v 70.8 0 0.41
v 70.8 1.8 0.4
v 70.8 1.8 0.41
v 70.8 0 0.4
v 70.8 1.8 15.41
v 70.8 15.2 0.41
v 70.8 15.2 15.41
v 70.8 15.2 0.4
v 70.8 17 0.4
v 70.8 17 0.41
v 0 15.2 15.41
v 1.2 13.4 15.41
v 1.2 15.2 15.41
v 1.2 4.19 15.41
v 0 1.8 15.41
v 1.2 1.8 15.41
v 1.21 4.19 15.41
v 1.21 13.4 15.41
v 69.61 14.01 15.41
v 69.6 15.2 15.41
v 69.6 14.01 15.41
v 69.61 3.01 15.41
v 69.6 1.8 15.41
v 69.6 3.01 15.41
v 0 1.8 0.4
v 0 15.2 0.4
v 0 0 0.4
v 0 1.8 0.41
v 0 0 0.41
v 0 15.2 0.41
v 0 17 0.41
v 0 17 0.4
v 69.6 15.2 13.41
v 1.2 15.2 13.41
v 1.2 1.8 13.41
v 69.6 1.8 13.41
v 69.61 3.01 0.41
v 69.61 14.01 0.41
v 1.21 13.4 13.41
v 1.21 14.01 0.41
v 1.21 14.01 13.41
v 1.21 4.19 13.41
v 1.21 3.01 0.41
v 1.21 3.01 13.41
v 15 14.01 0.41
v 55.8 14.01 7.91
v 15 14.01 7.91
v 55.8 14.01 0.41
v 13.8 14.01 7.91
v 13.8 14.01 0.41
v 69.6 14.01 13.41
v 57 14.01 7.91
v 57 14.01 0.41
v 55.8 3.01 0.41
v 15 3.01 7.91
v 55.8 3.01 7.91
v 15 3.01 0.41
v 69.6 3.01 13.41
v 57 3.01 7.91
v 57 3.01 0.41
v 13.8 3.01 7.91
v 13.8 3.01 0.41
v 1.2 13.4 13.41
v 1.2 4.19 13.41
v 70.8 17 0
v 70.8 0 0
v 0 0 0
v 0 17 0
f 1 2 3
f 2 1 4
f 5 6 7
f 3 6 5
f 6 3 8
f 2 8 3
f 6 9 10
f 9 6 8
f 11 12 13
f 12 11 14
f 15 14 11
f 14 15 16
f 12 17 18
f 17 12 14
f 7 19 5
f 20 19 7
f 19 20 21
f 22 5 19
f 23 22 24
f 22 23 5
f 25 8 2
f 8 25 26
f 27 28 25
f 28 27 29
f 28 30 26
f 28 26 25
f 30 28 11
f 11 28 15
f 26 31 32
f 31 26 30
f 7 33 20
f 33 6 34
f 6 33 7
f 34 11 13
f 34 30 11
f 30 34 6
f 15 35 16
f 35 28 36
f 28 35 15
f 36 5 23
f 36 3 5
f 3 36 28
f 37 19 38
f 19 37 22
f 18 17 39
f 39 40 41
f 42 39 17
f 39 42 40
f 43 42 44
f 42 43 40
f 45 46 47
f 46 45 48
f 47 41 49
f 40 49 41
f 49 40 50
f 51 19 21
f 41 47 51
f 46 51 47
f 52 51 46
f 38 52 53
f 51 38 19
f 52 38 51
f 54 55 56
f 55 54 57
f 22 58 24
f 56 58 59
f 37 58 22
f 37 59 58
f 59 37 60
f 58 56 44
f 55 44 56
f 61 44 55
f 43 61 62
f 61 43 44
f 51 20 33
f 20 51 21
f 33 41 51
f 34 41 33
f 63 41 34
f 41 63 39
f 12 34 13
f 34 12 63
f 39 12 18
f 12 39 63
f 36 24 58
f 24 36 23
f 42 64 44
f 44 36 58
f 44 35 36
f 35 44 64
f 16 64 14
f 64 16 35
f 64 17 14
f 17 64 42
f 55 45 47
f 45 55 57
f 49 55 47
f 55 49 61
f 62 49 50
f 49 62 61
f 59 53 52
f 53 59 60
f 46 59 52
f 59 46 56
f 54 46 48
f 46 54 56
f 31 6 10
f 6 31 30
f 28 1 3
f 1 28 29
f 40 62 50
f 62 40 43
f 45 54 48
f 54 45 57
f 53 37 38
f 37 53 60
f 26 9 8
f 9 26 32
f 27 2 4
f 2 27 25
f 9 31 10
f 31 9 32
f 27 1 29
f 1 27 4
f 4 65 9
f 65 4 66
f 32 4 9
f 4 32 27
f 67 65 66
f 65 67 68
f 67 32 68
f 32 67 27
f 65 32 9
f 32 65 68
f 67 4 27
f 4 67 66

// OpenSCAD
// file: ../../Base/Rotation.scad
// Fischertechnik Box Foundation
// Geometry Helpers Rotation

include <PlacementOptions.scad>

// getRotatedSpace(space, rotation=NoRotation)
// Rotates the space dependent on the specified rotation

function getRotatedSpace(space, rotation=NoRotation) = [
    (rotation == Rotate90 || rotation == Rotate270) ? space.y : space.x,
    (rotation == Rotate90 || rotation == Rotate270) ? space.x : space.y
];

// Rotates the given space around the fixed left lower corner
// space = the space the children needs as width/depth list [width,depth]
// rotation = 0 Rotate0 degrees, 1 Rotate90 degrees, 2 Rotate180 degrees, 3 Rotate270 degrees (equivalent to -90)

module RotateFix(space, rotation=NoRotation) {
    dy = (rotation == Rotate0 || rotation == Rotate270) ? 0 :
        (rotation == Rotate90) ? space.x :
        space.y;
    dx = (rotation < Rotate180) ? 0 :
        (rotation == Rotate180) ? space.x :
        space.y;
    
    translate([dx, dy, 0])
        rotate([0, 0, rotations[rotation]])
            children();
}
// file: ../../Base/Alignment.scad
// Fischertechnik Box Foundation
// Geometry Helpers Alignment

include <PlacementOptions.scad>

// getAlignedX(elementWidth, spaceWidth, align=AlignRight, offset=0)
// Gets the aligned X offset of an element with the given
// width in the given space.
// elementWidth = The width of the element to positon
// spaceWidth = The space where the element should be aligned
// align = 0 AlignLeft, 1 AlignCenter, 2 AlignRight
// offset = an optional offset from the aligned position. When
// aligned left or centered, then positive values are in X direction.
// When aligned right then positive values are in negative X direction.

function getAlignedX(elementWidth, spaceWidth, align=AlignRight, offset=0) =
    (align == AlignLeft) ?
        offset :
        ((align == AlignCenter) ?
        (spaceWidth - elementWidth)/2 + offset :
        spaceWidth - offset - elementWidth);

// getAlignedY(elementDepth, spaceDepth, align=AlignTop, offset=0)
// Gets the aligned Y offset of an element with the given
// depth in the given space.
// elementDepth = The depth of the element to positon
// spaceDepth = The space where the element should be aligned
// align = 0 AlignBottom, 1 AlignCenter, 2 AlignTop
// offset = an optional offset from the aligned position. When
// aligned bottom or centered, then positive values are in Y direction.
// When aligned top then positive values are in negative Y direction.

function getAlignedY(elementDepth, spaceDepth, align=AlignTop, offset=0) =
    (align == AlignBottom) ?
        offset :
        ((align == AlignCenter) ?
        (spaceDepth - elementDepth)/2 + offset :
        spaceDepth - offset - elementDepth);
// file: ../../Base/Boxes.scad
// Fischertechnik Box Foundation
// Pre-designed Boxes

use <Constants.scad>

include <PlacementOptions.scad>

box190Width = 190;
box190Depth = 130;
box130Width = 130;
box130Depth = 95;

// Values are from an original ec3 box
topBottomDifference = 1.5;
outerHeight = 40;
baseThickness = 1.8;
innerHeight = outerHeight - baseThickness;
stackExcess = 5.7;
radius = 3.5;
wallThickness = 1.5;
tolerance = 0.2;

boxWallThickness = wallThickness;
boxBaseThickness = baseThickness;
boxWebWidth = 3.0;

// getBoxWallThickness()
// Gets the wall thickness of a Fischertechnik Box
function getBoxWallThickness() = boxWallThickness;

// getBoxUsageHeight(height = 38.2)
// Gets the usable height of a Fischertechnik box
// height = Outer height of the box from the bottom to the upper edge.
function getBoxUsageHeight(height = outerHeight) = height - baseThickness - stackExcess;

// getBoxInnerHeight()
// Gets the inner height of a Fischertechnik box, including the stack excess
function getBoxInnerHeight() = innerHeight;

// getBoxBaseThickness()
// Gets the thickness of the Fischertechnik box base.
function getBoxBaseThickness() = boxBaseThickness;

// getBoxWebWidth()
// Gets the width of a box web
function getBoxWebWidth() = boxWebWidth;

// getBox190Space()
// Gets the usable inner space of a Box 190 as an x/y-list
function getBox190Space() = [
    box190Width - 2*getBoxWallThickness() - topBottomDifference, 
    box190Depth - 2*getBoxWallThickness() - topBottomDifference ];

// RoundedCornerPlate(width, depth, height, radius)
// Creates a body plate with rounded corners for a box. Used
// also to create the complete box with the hull module.
// width = Width of the plate
// depth = depth of the plate 
// height = thickness of the plate
// radius = radius of the rounded corner
module RoundedCornerPlate(width, depth, height, radius) {
    translate([radius, radius])
    hull() {
        w = width-2*radius;
        d = depth-2*radius;
        cube([w, d, height]);
        cylinder(height, r=radius, $fn=getFragments());
        translate([w, 0])
            cylinder(height, r=radius, $fn=getFragments());
        translate([w, d])
            cylinder(height, r=radius, $fn=getFragments());
        translate([0, d])
            cylinder(height, r=radius, $fn=getFragments());
    }
}

// BoxBase(width, depth)
// Creates an empty stackable Fischertechnik compatible box
// width = Outer width of the box (190, 130, ...)
// depth = Outer depth of the box (130, 95, ...)

module BoxBase(width, depth, height=outerHeight) {    
    thinPlate = 0.01;

    innerHeight = height - baseThickness;    
    
    module Body(tolerance=tolerance) {
        hull() {
            // Bottom with tolerance to fit into the original boxes when stacked
            translate([-wallThickness+tolerance, -wallThickness+tolerance, -baseThickness])
                RoundedCornerPlate(width-topBottomDifference-2*tolerance, depth-topBottomDifference-2*tolerance, thinPlate, radius);
            
            // Top
            translate([-wallThickness-topBottomDifference/2, -wallThickness-topBottomDifference/2, innerHeight-thinPlate])
                RoundedCornerPlate(width, depth, thinPlate, radius);
         }
    }

    module Cutoff() {
        hull() {
            coWidth = width - 2*wallThickness;
            coDepth = depth - 2*wallThickness;
            
            // Bottom
            RoundedCornerPlate(coWidth-topBottomDifference, coDepth-topBottomDifference, thinPlate, radius);

            // Top
            translate([-topBottomDifference/2, -topBottomDifference/2, innerHeight+thinPlate]) 
                RoundedCornerPlate(coWidth, coDepth, thinPlate, radius);
        }
    }
    
    difference() {        
        Body();
        Cutoff();
        stackOffset = innerHeight - stackExcess;
        translate([0, 0, stackOffset + baseThickness])
            Body(tolerance=0);
    }
}

// Creates the Fischertechnik empty box 130x190 mm and places it at position 0,0
// 190x130 are the outer sizes, the inner space is slightly smaller. Use getBox190Space() to get the inner sizes.
// The box is positioned that the usable inner space is at the 0,0,0 position.

module Box190() {
    BoxBase(box190Width, box190Depth);
}

// Gets the usable inner space of a Box 130 as an x/y-list
function getBox130Space() = [
    box130Width - 2*getBoxWallThickness() - topBottomDifference, 
    box130Depth - 2*getBoxWallThickness() - topBottomDifference ];

// Creates the Fischertechnik empty box 95x130 mm and places it at position 0,0
// 190x130 are the outer sizes, the inner space is slightly smaller. Use getBox190Space() to get the inner sizes.
// The box is positioned that the usable inner space is at the 0,0,0 position.

module Box130() {
    BoxBase(box130Width, box130Depth);
}

// Creates a web at the specified box walls
// corner 0 = LowerLeft, 1 = UpperLeft, 2 = UpperRight, 3 = LowerRight
// side 0 = LeftOfCorner, 1 = RightOfCorner
// distance = Distance in mm from the corner
// boxSpace = inner width and depth of the box (default: Box 190)
// webWidth = length of the web (default is 3 mms)
// webThickness = thickness of the web (default is 1 mm)
// height = Height of the web (standard is getBoxUsageHeight())
// sink = How much of the web is sunk into the wall

module BoxWeb(
    corner, 
    side, 
    distance, 
    boxSpace=getBox190Space(), 
    webWidth=getBoxWebWidth(), 
    webThickness=1.0, 
    height=getBoxUsageHeight(),
    sink = getBoxWallThickness()/2) {
    width = (corner % 2 == 0) ? 
            (side == LeftOfCorner ? webWidth : webThickness) :
            (side == LeftOfCorner ? webThickness : webWidth);

    depth = (corner % 2 == 0) ? 
            (side == RightOfCorner ? webWidth : webThickness) :
            (side == RightOfCorner ? webThickness : webWidth);
    
    xDiff = corner == LowerLeft ? 
                (side == LeftOfCorner ? -sink : distance) :
            (corner == UpperLeft ?                
                (side == LeftOfCorner ? distance : -sink) :
            (corner == UpperRight ?
                (side == LeftOfCorner ? boxSpace.x-webWidth+sink : boxSpace.x-distance-webThickness) :
                (side == LeftOfCorner ? boxSpace.x-distance-webThickness: boxSpace.x-webWidth+sink)));

    yDiff = corner == LowerLeft ? 
                (side == RightOfCorner ? -sink : distance) :
            (corner == UpperLeft ?
                (side == RightOfCorner ? boxSpace.y-distance-webThickness : boxSpace.y-webWidth+sink) :
            (corner == UpperRight ?
                (side == RightOfCorner ? boxSpace.y-webWidth+sink : boxSpace.y-distance-webThickness) :
                (side == RightOfCorner ? distance : -sink)));
    
    translate([xDiff, yDiff, -getExcess()])
        cube([width, depth, height + 2*getExcess()]);
}
// file: ../../Base/PlacementOptions.scad
// Fischertechnik Box Foundation
// Placement Options

// Alignment
NoAlign = 0;
AlignLeft = 1;
AlignBottom = 2;
AlignCenter = 3;
AlignRight = 4;
AlignTop = 5;

// Element rotation degree steps
rotations = [0, -90, -180, -270];

// Rotation
NoRotation = 0;
Rotate0 = 0;
Rotate90 = 1;
Rotate180 = 2;
Rotate270 = 3;

// Docking (seen from above)
NoDock = -1;
DockLeft = 0;
DockTop = 1;
DockRight = 2;
DockCorner = 2;
DockBottom = 3;

// Web corners
LowerLeft = 0;
UpperLeft = 1;
UpperRight = 2;
LowerRight = 3;

// Web position relative to corner
LeftOfCorner = 0;
RightOfCorner = 1;

// Rails direction
Horizontal = true;
Vertical = false;
// file: ../../Base/Placement.scad
// Fischertechnik Box Foundation
// Geometry Helpers Placement

use <Constants.scad>
use <Alignment.scad>
use <Rotation.scad>
use <Boxes.scad>

include <PlacementOptions.scad>

// Place(x=0, y=0, elementSpace=[0,0], alignX=AlignLeft, alignY=AlignBottom, rotation=Rotate0, boxSpace=getBox190Space())
// Places the child at the specified position
// y = Y-Position. This is a relative position when an X aligment is specified.
// x = X-Position. This is a relative position when an Y aligment is specified.
// elementSpace = space of the element to be placed [x,y]
// alignX = -1=NoAlign, 0 AlignLeft, 1 AlignCenter, 3 AlignRight (elementSpace and boxSpace required!)
// alignY = -1=NoAlign, 2 AlignBottom, 1 AlignCenter, 4 AlignTop (elementSpace and boxSpace required!)
// rotation = 0 Rotate0 0 degrees, 1 Rotate90 90 degrees, 
// 2 Rotate180 180 degrees, 3 Rotate270 270 degrees (equivalent to -90)
// boxSpace = Inner space of the box where the placement occurs [x,y] - default is Box 190x130 inner space

module Place(x=0, y=0, elementSpace=[0,0], 
  alignX=AlignLeft, alignY=AlignBottom, 
  rotation=NoRotation, boxSpace=getBox190Space()) {

    module Position(x, y, space, rotation=Rotate0) {
        translate([x, y, 0])
            RotateFix(space, rotation)
                children();
    }

    space = getRotatedSpace(elementSpace, rotation);
    alignedX = getAlignedX(space.x, boxSpace.x, alignX, x);
    alignedY = getAlignedY(space.y, boxSpace.y, alignY, y);
    Position(alignedX, alignedY, elementSpace, rotation)
        children();
}

// Center(space=getBox130Space(), elementSpace=[0,0])
// space = Space where the children is centered. For cylinder use centered=true and no elementSpace.
// elementSpace = space of the element to be centered [x,y]

module Center(space=getBox190Space(), elementSpace=[0,0]) {
    Place(elementSpace=elementSpace, boxSpace=space, alignX=AlignCenter, alignY=AlignCenter)
        children();
}

// CenterHorizontal(width=0, y=0, offset=0, space=getBox130Space())
// width = Width of the element to be placed.
// y = Y position of the element
// offset = Offset from the center position (negative will be left of the center)
// space = Space where the element is placed

module CenterHorizontal(width=0, y=0, offset=0, space=getBox190Space()) {
    Place(x=offset, y=y, elementSpace=[width, 0], boxSpace=space, alignX=AlignCenter)
        children(0);
}

// CenterVertical(depth=0, x=0, offset=0, space=getBox130Space())
// depth = Depth of the element to be placed.
// x = X position of the element
// offset = Offset from the center position (negative will be down of the center)
// space = Space where the element is placed

module CenterVertical(depth=0, x=0, offset=0, space=getBox190Space()) {
    Place(x=x, y=offset, elementSpace=[0, depth], boxSpace=space, alignY=AlignCenter)
        children(0);
}

// getIsVertical(align)
// True if the specified alignment needs a vertical orientation for a divider (AlignRight, AlignLeft)

function getIsVertical(align) = (align == AlignRight || align == AlignLeft);

// getIsHorizontal(align)
// True if the specified alignment needs a horizontal orientation for a divider (AlignTop, AlignBottom)

function getIsHorizontal(align) = (align == AlignTop || align == AlignBottom);
// file: ../../Elements/AxisClip10.scad
// Fischertechnik Box Library
// Axis for clip 10
// 31023

use <../ModelBase/Simple.scad>
use <../Base/Constants.scad>

/* [Element Parameters] */
height = 23;
clipHeight = 10;

/* [Hidden] */
width = 12;
depth = 12;
upperDiameter = 3.6;

// getAxisClip10Space()
// Gets the space of a n axis for a clip 10 with spring ring (mot2)

function getAxisClip10Space() = [width, depth, height];

// AxisClip10(height, clipHeight)
// Axis for clip 10 with spring ring (mot2)
// height = Height of the complete axis (standard is 23, in mot3 its only 12)
// clipHeight = Height of the part for the clip (standard is 10, in mot3 its only 7)

module AxisClip10(height=height, clipHeight=clipHeight) {
    LeveledAxisWithSpace(height, height-clipHeight, getAxisClip10Space(), diameter=upperDiameter);
}

// Test
color("lightgray")
AxisClip10(height, clipHeight);
// file: ../../Base/Constants.scad
// Fischertechnik Box Foundation
// Constants

// Constant values necessary for multiple elements

// Base constants
dividerThickness = 1.2;
excess = 0.01;
fragments = 90;
tolerance = 0.8;

// Gets the thickness of a divider 
function getDividerThickness() = dividerThickness;

// Gets the excess that is used to merge walls into each other
function getExcess() = excess;

// Gets amount of fragments of a cylinder
function getFragments() = fragments;

// Gets the inner tolerance of a frame to each side
function getTolerance() = tolerance;


// Fischertechnik specific constants
axisDiameter = 4;
axisBottomDiameter = axisDiameter + 1;
axisTolerance = 0.2;

// Gets axis diameter of Fischertechnik axis
function getAxisDiameter() = axisDiameter;

// Gets axis diameter tolerance (subtracted for element axis)
function getAxisTolerance() = axisTolerance;

// Gets the axis diameter for standing axis
function getStandAxisDiameter() = getAxisDiameter() - getAxisTolerance();

// Gets axis bottom diameter for thicker part at the bottom
function getAxisBottomDiameter() = axisBottomDiameter;

pinHeight = 2.5;
pinTolerance = 0.2;

// gets the height of a connecting pin
function getPinHeight() = pinHeight;

// gets the connecting pin height tolerance
function getPinTolerance() = pinTolerance;

standardEdgeDistance = 2.5;
standardWebDistance = 11.5;
standardCornerLength = 15;

// gets the standard distance to the wall of the box for dockable frames with webs
function getStandardEdgeDistance() = standardEdgeDistance;

// gets the standard distance of each web to the corner of the dockable frame
function getStandardWebDistance() = standardWebDistance;

// gets the standard length of the corner walls of a dockable frame
function getStandardCornerLength() = standardCornerLength;

tubeWallFactor = 0.8;

// gets the wall thickness of a tube.
function getTubeWallThickness() = tubeWallFactor * getDividerThickness();

smallPartsFrameHeight = 20;

// gets the frame height for docked small parts boxes.
function getSmallPartsFrameHeight() = smallPartsFrameHeight;

hubRingDiameter = 19.5;
hubRingLevelDiameter = 21;

// gets the diameter of a tube matching the inner ring of a wheel
function getHubRingDiameter() = hubRingDiameter;

// gets the diameter of a hub tube with a thicker diameter
function getHubRingLevelDiameter() = hubRingLevelDiameter;
// file: ../../Elements/FrameGearRack60.scad
// Fischertechnik Box Library
// Frame for gear rack 60 for mini-motor lifting gear
// 37451

use <../ModelBase/Complex.scad>

/* [Hidden] */
width = 60;

// getFrameGearRack60Space()
// Gets the space of a frame for the gear rack 30 for mini-motor lifting gear
// dock = true, if the frame should be docked to the wall at the left side

function getFrameGearRack60Space(dock=false) = getGearRackSpace(width, dock);

// FrameGearRack60()
// Frame for the gear rack 60 for mini-motor lifting gear
// dock = true, if the frame should be docked to the wall at the left side

module FrameGearRack60(dock=false) {
    GearRack(width, dock);
}

// test
color("lightgray")
FrameGearRack60();
// file: ../TestPrint.scad
// 3D Print Test Base

use <../Base/Constants.scad>

use <../Elements/AxisClip10.scad>

module TestPrint(elementSpace) {
    cube([elementSpace.x, elementSpace.y, 0.4]);
    translate([0,0,0.4+getExcess()]) {
        children();
    }
}

TestPrint(getAxisClip10Space())
    AxisClip10();
// main file
// 3D Print Test
// FrameGearRack60

use <../TestPrint.scad>
use <../../Elements/FrameGearRack60.scad>

TestPrint(getFrameGearRack60Space())
    FrameGearRack60();
